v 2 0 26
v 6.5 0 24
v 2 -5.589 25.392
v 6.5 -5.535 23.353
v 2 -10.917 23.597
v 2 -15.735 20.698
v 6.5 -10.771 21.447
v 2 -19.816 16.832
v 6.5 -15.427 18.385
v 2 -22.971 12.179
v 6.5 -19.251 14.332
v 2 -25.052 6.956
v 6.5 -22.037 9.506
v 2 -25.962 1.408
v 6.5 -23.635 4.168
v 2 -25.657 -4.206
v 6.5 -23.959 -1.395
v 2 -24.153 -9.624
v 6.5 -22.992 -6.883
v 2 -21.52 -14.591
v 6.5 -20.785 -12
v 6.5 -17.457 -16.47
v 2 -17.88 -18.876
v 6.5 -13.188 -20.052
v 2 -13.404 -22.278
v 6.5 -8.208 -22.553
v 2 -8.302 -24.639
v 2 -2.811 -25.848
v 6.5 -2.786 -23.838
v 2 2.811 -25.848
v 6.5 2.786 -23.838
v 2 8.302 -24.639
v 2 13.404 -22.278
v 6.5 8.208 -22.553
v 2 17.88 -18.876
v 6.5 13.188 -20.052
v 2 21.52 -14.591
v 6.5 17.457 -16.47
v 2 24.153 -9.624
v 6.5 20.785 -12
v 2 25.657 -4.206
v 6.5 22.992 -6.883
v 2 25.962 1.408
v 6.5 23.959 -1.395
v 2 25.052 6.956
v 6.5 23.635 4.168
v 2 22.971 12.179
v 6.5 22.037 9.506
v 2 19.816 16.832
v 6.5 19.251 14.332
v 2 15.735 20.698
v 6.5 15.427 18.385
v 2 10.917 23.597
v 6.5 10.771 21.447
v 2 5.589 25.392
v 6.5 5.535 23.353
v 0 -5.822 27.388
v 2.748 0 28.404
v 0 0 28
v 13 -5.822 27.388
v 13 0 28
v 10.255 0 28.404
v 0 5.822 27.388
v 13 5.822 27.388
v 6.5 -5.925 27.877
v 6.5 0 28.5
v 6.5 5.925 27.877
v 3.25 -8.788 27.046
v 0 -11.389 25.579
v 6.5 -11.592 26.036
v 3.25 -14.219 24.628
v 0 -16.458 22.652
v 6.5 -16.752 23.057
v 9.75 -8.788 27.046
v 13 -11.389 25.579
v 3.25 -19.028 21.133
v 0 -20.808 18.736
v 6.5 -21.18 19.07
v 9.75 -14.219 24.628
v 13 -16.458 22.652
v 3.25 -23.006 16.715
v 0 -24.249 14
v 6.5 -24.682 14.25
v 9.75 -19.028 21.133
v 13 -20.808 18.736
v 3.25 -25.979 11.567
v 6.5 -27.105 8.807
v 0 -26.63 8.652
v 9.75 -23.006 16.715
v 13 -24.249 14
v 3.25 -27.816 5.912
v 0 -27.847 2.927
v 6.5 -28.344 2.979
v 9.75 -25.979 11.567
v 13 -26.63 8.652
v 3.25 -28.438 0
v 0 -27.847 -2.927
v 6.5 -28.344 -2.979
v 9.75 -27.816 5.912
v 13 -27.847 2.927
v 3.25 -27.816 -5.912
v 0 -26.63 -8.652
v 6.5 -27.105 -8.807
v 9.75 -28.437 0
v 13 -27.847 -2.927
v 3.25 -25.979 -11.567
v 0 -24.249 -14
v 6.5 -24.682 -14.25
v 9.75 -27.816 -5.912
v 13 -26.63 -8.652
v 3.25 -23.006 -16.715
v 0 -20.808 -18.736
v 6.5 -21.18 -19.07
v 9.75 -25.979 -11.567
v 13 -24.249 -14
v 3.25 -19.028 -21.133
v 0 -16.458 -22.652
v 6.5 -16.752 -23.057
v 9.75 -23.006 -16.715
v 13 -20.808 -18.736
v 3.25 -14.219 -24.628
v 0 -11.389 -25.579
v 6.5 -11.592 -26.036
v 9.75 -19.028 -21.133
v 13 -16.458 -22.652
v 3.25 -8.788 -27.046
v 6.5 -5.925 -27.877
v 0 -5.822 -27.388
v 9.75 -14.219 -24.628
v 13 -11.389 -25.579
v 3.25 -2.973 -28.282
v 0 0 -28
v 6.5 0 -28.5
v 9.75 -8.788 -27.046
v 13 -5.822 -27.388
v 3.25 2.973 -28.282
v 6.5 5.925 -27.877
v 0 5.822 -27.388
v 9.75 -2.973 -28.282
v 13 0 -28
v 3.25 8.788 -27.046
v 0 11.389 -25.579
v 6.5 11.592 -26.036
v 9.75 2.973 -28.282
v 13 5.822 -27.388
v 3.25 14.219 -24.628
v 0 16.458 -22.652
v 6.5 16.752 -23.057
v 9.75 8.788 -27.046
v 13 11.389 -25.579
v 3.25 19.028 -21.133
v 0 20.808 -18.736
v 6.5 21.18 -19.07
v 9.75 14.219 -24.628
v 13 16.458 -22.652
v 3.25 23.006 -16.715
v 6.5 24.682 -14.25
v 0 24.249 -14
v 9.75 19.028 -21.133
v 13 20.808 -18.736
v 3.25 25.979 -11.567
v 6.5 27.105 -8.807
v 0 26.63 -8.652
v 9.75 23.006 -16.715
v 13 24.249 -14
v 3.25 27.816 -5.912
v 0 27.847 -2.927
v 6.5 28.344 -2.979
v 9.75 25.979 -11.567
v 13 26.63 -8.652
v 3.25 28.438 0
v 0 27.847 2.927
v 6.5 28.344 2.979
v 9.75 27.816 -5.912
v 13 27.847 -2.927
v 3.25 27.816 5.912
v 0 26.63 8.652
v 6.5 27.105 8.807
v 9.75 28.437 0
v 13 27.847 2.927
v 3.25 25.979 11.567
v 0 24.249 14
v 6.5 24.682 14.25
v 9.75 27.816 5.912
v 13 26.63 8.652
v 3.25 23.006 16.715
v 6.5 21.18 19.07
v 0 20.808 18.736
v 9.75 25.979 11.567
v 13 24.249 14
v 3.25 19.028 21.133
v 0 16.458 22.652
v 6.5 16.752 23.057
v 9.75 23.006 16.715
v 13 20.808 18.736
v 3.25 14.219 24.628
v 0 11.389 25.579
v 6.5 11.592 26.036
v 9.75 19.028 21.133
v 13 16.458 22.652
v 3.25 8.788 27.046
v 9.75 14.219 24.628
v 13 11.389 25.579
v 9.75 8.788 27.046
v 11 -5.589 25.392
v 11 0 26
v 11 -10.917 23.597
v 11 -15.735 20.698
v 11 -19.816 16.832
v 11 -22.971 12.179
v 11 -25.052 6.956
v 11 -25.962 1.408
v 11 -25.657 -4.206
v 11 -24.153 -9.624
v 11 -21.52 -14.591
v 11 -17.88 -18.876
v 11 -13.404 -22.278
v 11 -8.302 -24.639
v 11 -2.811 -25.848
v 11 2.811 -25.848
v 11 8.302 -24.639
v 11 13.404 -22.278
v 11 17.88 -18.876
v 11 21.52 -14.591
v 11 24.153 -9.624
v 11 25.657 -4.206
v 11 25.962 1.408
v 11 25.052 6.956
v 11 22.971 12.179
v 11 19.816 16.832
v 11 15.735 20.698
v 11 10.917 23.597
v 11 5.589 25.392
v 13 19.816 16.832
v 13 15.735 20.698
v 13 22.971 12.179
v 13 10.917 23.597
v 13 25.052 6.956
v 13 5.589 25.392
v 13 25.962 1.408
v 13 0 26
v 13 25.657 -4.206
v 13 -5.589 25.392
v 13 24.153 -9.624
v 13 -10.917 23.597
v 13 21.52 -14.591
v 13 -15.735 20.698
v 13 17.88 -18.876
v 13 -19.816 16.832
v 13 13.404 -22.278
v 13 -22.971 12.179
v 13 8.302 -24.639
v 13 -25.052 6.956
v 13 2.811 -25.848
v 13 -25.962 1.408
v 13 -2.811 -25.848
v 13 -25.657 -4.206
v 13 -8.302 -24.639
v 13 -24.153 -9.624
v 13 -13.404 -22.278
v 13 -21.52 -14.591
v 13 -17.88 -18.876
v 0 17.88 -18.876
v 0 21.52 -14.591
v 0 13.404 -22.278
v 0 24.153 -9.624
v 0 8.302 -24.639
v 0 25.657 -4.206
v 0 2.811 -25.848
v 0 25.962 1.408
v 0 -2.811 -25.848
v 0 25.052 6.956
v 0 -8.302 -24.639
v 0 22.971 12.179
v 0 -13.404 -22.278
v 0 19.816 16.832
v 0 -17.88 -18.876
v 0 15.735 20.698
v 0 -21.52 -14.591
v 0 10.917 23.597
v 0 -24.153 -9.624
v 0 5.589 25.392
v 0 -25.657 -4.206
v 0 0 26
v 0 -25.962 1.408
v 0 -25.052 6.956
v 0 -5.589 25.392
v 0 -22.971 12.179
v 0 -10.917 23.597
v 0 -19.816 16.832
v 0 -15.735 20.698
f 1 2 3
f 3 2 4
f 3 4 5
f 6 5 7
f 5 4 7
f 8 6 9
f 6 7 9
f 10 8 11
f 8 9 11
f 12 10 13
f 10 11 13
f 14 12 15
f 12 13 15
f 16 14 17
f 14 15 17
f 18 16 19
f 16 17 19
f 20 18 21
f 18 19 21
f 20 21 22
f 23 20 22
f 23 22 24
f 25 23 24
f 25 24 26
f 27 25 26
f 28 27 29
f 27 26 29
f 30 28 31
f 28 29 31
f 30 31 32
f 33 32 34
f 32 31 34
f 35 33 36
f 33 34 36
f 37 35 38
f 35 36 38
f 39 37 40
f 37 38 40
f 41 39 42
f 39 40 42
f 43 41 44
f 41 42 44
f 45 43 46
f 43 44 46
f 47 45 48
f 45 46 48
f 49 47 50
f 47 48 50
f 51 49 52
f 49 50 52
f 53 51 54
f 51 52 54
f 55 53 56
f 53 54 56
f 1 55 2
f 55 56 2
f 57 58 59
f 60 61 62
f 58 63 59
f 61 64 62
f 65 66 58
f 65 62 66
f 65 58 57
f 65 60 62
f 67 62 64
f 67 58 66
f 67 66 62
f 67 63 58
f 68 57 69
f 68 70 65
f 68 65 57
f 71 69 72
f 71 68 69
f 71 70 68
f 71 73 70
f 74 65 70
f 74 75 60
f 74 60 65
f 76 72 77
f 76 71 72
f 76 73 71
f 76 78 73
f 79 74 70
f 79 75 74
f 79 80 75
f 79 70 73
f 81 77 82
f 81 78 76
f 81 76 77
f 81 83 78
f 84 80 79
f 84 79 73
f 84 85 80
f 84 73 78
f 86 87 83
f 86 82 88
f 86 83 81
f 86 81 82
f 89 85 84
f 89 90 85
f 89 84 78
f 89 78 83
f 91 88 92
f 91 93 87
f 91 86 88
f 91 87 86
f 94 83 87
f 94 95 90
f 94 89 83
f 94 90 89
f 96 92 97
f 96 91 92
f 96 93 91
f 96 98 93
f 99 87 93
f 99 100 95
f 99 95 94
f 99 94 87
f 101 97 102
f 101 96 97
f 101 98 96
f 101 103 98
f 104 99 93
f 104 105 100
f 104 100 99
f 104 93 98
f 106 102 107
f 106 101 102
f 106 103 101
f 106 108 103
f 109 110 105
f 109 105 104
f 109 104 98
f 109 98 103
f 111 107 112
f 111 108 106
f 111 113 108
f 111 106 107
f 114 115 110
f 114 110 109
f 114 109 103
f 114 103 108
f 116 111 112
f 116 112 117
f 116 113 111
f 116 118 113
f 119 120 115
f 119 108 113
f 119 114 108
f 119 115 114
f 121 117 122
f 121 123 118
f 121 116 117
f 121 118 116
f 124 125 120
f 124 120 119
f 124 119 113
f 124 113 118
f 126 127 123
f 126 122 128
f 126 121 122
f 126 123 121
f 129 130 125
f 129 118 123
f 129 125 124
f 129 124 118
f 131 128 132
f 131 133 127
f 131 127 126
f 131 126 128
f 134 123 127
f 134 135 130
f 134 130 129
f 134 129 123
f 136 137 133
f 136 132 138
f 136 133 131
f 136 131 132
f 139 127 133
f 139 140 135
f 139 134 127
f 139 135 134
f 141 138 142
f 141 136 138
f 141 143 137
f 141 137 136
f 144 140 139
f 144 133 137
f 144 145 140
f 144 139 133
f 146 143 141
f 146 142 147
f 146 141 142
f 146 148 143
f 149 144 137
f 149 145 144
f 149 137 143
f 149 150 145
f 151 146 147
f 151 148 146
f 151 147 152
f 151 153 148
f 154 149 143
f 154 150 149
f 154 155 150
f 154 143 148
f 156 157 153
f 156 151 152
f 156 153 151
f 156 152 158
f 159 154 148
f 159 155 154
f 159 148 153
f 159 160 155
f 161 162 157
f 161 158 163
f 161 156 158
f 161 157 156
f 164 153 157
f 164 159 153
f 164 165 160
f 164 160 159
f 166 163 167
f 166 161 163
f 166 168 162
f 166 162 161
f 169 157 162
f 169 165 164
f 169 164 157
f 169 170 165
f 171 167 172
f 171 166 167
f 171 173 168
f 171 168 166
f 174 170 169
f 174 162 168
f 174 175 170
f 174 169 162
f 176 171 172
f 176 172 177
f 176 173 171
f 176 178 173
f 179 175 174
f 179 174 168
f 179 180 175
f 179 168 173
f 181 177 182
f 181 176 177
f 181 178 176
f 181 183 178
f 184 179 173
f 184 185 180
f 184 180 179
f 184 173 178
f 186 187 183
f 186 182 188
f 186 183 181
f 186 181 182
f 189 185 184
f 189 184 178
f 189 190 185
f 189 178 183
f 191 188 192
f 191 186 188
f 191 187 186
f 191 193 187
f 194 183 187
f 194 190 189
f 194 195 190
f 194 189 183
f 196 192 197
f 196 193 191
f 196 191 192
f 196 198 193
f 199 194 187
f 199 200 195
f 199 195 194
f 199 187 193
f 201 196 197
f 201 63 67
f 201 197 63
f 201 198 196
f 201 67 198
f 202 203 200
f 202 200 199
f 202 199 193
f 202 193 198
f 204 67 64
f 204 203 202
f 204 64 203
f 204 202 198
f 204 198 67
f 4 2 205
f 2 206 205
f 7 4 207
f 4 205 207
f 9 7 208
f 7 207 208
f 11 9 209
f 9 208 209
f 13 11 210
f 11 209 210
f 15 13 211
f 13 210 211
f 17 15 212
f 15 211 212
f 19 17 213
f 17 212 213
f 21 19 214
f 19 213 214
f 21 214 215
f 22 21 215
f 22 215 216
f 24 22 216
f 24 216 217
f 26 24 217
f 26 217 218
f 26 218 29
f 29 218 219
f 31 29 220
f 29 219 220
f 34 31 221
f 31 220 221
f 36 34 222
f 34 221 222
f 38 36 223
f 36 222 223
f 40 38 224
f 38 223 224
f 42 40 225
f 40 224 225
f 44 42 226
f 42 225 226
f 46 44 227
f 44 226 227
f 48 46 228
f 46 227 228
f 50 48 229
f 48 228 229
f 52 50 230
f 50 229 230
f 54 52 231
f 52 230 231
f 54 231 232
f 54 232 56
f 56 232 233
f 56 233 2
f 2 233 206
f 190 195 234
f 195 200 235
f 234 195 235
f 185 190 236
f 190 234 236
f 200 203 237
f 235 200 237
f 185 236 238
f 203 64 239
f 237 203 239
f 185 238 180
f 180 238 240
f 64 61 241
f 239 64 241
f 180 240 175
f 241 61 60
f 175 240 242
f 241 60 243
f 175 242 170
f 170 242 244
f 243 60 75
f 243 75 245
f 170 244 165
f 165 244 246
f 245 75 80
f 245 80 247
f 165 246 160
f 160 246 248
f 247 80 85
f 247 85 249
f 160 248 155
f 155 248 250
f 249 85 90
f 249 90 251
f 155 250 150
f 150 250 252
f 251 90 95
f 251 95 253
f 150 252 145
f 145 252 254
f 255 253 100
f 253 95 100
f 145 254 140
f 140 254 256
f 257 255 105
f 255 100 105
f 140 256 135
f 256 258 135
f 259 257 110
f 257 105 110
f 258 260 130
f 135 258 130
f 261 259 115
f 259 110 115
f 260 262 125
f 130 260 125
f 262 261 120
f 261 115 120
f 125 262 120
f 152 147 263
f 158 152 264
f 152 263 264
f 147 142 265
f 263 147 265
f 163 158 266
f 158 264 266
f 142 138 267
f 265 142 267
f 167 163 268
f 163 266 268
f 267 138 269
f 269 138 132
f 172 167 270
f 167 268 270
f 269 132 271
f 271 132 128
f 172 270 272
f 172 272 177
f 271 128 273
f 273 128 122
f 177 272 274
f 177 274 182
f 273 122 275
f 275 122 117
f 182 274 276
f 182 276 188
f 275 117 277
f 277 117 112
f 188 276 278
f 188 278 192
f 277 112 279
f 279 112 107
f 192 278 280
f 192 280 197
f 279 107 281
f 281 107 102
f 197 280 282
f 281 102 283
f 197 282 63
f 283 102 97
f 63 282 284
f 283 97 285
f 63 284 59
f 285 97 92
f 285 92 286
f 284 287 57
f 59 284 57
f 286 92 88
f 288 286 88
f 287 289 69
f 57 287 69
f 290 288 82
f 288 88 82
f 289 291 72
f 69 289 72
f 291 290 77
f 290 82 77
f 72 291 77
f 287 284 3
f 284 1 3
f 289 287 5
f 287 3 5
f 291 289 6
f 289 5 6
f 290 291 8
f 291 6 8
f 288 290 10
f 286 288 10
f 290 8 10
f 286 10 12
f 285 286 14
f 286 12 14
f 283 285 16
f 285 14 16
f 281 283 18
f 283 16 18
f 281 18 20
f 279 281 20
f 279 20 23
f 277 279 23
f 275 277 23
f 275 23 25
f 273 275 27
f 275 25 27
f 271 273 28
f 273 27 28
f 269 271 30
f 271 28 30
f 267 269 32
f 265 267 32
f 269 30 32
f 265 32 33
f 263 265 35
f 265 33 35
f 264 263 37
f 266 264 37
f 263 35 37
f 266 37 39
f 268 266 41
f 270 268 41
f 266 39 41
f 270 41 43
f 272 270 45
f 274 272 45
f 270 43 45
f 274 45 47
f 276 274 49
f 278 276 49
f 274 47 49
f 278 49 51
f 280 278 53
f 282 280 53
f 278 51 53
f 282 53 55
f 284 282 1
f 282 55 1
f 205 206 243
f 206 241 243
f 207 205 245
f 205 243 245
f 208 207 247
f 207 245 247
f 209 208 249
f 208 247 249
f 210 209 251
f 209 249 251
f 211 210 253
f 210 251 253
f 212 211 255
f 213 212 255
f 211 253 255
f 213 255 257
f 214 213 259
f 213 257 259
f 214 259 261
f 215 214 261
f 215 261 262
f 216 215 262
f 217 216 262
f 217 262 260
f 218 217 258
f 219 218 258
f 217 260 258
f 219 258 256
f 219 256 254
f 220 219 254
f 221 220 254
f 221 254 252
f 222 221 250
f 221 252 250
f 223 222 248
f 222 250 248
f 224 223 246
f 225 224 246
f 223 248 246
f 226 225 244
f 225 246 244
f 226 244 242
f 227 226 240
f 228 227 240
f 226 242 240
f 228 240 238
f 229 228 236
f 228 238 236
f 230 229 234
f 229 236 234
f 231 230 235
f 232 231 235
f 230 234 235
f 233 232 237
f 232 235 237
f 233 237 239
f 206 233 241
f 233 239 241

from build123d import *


with BuildPart() as f2:
    # F1 (on Front) → F2 (revolve)
    with BuildSketch(Plane.XZ):
        with BuildLine():
            Line((0, 28), (0, 26))
            Line((0, 26), (2, 26))
            Line((2, 26), (6.5, 24))
            Line((6.5, 24), (11, 26))
            Line((11, 26), (13, 26))
            Line((13, 26), (13, 28))
            add(Edge.make_bspline(
                [(0, 28), (2.166667, 28.5), (6.5, 28.5), (10.833333, 28.5), (13, 28)],
                knots=[0, 0, 0, 0, 6.519202, 13.038405, 13.038405, 13.038405, 13.038405], degree=3))
        make_face()
    revolve(axis=Axis((14, 0, 0), (1, 0, 0)))


solid = f2.part
